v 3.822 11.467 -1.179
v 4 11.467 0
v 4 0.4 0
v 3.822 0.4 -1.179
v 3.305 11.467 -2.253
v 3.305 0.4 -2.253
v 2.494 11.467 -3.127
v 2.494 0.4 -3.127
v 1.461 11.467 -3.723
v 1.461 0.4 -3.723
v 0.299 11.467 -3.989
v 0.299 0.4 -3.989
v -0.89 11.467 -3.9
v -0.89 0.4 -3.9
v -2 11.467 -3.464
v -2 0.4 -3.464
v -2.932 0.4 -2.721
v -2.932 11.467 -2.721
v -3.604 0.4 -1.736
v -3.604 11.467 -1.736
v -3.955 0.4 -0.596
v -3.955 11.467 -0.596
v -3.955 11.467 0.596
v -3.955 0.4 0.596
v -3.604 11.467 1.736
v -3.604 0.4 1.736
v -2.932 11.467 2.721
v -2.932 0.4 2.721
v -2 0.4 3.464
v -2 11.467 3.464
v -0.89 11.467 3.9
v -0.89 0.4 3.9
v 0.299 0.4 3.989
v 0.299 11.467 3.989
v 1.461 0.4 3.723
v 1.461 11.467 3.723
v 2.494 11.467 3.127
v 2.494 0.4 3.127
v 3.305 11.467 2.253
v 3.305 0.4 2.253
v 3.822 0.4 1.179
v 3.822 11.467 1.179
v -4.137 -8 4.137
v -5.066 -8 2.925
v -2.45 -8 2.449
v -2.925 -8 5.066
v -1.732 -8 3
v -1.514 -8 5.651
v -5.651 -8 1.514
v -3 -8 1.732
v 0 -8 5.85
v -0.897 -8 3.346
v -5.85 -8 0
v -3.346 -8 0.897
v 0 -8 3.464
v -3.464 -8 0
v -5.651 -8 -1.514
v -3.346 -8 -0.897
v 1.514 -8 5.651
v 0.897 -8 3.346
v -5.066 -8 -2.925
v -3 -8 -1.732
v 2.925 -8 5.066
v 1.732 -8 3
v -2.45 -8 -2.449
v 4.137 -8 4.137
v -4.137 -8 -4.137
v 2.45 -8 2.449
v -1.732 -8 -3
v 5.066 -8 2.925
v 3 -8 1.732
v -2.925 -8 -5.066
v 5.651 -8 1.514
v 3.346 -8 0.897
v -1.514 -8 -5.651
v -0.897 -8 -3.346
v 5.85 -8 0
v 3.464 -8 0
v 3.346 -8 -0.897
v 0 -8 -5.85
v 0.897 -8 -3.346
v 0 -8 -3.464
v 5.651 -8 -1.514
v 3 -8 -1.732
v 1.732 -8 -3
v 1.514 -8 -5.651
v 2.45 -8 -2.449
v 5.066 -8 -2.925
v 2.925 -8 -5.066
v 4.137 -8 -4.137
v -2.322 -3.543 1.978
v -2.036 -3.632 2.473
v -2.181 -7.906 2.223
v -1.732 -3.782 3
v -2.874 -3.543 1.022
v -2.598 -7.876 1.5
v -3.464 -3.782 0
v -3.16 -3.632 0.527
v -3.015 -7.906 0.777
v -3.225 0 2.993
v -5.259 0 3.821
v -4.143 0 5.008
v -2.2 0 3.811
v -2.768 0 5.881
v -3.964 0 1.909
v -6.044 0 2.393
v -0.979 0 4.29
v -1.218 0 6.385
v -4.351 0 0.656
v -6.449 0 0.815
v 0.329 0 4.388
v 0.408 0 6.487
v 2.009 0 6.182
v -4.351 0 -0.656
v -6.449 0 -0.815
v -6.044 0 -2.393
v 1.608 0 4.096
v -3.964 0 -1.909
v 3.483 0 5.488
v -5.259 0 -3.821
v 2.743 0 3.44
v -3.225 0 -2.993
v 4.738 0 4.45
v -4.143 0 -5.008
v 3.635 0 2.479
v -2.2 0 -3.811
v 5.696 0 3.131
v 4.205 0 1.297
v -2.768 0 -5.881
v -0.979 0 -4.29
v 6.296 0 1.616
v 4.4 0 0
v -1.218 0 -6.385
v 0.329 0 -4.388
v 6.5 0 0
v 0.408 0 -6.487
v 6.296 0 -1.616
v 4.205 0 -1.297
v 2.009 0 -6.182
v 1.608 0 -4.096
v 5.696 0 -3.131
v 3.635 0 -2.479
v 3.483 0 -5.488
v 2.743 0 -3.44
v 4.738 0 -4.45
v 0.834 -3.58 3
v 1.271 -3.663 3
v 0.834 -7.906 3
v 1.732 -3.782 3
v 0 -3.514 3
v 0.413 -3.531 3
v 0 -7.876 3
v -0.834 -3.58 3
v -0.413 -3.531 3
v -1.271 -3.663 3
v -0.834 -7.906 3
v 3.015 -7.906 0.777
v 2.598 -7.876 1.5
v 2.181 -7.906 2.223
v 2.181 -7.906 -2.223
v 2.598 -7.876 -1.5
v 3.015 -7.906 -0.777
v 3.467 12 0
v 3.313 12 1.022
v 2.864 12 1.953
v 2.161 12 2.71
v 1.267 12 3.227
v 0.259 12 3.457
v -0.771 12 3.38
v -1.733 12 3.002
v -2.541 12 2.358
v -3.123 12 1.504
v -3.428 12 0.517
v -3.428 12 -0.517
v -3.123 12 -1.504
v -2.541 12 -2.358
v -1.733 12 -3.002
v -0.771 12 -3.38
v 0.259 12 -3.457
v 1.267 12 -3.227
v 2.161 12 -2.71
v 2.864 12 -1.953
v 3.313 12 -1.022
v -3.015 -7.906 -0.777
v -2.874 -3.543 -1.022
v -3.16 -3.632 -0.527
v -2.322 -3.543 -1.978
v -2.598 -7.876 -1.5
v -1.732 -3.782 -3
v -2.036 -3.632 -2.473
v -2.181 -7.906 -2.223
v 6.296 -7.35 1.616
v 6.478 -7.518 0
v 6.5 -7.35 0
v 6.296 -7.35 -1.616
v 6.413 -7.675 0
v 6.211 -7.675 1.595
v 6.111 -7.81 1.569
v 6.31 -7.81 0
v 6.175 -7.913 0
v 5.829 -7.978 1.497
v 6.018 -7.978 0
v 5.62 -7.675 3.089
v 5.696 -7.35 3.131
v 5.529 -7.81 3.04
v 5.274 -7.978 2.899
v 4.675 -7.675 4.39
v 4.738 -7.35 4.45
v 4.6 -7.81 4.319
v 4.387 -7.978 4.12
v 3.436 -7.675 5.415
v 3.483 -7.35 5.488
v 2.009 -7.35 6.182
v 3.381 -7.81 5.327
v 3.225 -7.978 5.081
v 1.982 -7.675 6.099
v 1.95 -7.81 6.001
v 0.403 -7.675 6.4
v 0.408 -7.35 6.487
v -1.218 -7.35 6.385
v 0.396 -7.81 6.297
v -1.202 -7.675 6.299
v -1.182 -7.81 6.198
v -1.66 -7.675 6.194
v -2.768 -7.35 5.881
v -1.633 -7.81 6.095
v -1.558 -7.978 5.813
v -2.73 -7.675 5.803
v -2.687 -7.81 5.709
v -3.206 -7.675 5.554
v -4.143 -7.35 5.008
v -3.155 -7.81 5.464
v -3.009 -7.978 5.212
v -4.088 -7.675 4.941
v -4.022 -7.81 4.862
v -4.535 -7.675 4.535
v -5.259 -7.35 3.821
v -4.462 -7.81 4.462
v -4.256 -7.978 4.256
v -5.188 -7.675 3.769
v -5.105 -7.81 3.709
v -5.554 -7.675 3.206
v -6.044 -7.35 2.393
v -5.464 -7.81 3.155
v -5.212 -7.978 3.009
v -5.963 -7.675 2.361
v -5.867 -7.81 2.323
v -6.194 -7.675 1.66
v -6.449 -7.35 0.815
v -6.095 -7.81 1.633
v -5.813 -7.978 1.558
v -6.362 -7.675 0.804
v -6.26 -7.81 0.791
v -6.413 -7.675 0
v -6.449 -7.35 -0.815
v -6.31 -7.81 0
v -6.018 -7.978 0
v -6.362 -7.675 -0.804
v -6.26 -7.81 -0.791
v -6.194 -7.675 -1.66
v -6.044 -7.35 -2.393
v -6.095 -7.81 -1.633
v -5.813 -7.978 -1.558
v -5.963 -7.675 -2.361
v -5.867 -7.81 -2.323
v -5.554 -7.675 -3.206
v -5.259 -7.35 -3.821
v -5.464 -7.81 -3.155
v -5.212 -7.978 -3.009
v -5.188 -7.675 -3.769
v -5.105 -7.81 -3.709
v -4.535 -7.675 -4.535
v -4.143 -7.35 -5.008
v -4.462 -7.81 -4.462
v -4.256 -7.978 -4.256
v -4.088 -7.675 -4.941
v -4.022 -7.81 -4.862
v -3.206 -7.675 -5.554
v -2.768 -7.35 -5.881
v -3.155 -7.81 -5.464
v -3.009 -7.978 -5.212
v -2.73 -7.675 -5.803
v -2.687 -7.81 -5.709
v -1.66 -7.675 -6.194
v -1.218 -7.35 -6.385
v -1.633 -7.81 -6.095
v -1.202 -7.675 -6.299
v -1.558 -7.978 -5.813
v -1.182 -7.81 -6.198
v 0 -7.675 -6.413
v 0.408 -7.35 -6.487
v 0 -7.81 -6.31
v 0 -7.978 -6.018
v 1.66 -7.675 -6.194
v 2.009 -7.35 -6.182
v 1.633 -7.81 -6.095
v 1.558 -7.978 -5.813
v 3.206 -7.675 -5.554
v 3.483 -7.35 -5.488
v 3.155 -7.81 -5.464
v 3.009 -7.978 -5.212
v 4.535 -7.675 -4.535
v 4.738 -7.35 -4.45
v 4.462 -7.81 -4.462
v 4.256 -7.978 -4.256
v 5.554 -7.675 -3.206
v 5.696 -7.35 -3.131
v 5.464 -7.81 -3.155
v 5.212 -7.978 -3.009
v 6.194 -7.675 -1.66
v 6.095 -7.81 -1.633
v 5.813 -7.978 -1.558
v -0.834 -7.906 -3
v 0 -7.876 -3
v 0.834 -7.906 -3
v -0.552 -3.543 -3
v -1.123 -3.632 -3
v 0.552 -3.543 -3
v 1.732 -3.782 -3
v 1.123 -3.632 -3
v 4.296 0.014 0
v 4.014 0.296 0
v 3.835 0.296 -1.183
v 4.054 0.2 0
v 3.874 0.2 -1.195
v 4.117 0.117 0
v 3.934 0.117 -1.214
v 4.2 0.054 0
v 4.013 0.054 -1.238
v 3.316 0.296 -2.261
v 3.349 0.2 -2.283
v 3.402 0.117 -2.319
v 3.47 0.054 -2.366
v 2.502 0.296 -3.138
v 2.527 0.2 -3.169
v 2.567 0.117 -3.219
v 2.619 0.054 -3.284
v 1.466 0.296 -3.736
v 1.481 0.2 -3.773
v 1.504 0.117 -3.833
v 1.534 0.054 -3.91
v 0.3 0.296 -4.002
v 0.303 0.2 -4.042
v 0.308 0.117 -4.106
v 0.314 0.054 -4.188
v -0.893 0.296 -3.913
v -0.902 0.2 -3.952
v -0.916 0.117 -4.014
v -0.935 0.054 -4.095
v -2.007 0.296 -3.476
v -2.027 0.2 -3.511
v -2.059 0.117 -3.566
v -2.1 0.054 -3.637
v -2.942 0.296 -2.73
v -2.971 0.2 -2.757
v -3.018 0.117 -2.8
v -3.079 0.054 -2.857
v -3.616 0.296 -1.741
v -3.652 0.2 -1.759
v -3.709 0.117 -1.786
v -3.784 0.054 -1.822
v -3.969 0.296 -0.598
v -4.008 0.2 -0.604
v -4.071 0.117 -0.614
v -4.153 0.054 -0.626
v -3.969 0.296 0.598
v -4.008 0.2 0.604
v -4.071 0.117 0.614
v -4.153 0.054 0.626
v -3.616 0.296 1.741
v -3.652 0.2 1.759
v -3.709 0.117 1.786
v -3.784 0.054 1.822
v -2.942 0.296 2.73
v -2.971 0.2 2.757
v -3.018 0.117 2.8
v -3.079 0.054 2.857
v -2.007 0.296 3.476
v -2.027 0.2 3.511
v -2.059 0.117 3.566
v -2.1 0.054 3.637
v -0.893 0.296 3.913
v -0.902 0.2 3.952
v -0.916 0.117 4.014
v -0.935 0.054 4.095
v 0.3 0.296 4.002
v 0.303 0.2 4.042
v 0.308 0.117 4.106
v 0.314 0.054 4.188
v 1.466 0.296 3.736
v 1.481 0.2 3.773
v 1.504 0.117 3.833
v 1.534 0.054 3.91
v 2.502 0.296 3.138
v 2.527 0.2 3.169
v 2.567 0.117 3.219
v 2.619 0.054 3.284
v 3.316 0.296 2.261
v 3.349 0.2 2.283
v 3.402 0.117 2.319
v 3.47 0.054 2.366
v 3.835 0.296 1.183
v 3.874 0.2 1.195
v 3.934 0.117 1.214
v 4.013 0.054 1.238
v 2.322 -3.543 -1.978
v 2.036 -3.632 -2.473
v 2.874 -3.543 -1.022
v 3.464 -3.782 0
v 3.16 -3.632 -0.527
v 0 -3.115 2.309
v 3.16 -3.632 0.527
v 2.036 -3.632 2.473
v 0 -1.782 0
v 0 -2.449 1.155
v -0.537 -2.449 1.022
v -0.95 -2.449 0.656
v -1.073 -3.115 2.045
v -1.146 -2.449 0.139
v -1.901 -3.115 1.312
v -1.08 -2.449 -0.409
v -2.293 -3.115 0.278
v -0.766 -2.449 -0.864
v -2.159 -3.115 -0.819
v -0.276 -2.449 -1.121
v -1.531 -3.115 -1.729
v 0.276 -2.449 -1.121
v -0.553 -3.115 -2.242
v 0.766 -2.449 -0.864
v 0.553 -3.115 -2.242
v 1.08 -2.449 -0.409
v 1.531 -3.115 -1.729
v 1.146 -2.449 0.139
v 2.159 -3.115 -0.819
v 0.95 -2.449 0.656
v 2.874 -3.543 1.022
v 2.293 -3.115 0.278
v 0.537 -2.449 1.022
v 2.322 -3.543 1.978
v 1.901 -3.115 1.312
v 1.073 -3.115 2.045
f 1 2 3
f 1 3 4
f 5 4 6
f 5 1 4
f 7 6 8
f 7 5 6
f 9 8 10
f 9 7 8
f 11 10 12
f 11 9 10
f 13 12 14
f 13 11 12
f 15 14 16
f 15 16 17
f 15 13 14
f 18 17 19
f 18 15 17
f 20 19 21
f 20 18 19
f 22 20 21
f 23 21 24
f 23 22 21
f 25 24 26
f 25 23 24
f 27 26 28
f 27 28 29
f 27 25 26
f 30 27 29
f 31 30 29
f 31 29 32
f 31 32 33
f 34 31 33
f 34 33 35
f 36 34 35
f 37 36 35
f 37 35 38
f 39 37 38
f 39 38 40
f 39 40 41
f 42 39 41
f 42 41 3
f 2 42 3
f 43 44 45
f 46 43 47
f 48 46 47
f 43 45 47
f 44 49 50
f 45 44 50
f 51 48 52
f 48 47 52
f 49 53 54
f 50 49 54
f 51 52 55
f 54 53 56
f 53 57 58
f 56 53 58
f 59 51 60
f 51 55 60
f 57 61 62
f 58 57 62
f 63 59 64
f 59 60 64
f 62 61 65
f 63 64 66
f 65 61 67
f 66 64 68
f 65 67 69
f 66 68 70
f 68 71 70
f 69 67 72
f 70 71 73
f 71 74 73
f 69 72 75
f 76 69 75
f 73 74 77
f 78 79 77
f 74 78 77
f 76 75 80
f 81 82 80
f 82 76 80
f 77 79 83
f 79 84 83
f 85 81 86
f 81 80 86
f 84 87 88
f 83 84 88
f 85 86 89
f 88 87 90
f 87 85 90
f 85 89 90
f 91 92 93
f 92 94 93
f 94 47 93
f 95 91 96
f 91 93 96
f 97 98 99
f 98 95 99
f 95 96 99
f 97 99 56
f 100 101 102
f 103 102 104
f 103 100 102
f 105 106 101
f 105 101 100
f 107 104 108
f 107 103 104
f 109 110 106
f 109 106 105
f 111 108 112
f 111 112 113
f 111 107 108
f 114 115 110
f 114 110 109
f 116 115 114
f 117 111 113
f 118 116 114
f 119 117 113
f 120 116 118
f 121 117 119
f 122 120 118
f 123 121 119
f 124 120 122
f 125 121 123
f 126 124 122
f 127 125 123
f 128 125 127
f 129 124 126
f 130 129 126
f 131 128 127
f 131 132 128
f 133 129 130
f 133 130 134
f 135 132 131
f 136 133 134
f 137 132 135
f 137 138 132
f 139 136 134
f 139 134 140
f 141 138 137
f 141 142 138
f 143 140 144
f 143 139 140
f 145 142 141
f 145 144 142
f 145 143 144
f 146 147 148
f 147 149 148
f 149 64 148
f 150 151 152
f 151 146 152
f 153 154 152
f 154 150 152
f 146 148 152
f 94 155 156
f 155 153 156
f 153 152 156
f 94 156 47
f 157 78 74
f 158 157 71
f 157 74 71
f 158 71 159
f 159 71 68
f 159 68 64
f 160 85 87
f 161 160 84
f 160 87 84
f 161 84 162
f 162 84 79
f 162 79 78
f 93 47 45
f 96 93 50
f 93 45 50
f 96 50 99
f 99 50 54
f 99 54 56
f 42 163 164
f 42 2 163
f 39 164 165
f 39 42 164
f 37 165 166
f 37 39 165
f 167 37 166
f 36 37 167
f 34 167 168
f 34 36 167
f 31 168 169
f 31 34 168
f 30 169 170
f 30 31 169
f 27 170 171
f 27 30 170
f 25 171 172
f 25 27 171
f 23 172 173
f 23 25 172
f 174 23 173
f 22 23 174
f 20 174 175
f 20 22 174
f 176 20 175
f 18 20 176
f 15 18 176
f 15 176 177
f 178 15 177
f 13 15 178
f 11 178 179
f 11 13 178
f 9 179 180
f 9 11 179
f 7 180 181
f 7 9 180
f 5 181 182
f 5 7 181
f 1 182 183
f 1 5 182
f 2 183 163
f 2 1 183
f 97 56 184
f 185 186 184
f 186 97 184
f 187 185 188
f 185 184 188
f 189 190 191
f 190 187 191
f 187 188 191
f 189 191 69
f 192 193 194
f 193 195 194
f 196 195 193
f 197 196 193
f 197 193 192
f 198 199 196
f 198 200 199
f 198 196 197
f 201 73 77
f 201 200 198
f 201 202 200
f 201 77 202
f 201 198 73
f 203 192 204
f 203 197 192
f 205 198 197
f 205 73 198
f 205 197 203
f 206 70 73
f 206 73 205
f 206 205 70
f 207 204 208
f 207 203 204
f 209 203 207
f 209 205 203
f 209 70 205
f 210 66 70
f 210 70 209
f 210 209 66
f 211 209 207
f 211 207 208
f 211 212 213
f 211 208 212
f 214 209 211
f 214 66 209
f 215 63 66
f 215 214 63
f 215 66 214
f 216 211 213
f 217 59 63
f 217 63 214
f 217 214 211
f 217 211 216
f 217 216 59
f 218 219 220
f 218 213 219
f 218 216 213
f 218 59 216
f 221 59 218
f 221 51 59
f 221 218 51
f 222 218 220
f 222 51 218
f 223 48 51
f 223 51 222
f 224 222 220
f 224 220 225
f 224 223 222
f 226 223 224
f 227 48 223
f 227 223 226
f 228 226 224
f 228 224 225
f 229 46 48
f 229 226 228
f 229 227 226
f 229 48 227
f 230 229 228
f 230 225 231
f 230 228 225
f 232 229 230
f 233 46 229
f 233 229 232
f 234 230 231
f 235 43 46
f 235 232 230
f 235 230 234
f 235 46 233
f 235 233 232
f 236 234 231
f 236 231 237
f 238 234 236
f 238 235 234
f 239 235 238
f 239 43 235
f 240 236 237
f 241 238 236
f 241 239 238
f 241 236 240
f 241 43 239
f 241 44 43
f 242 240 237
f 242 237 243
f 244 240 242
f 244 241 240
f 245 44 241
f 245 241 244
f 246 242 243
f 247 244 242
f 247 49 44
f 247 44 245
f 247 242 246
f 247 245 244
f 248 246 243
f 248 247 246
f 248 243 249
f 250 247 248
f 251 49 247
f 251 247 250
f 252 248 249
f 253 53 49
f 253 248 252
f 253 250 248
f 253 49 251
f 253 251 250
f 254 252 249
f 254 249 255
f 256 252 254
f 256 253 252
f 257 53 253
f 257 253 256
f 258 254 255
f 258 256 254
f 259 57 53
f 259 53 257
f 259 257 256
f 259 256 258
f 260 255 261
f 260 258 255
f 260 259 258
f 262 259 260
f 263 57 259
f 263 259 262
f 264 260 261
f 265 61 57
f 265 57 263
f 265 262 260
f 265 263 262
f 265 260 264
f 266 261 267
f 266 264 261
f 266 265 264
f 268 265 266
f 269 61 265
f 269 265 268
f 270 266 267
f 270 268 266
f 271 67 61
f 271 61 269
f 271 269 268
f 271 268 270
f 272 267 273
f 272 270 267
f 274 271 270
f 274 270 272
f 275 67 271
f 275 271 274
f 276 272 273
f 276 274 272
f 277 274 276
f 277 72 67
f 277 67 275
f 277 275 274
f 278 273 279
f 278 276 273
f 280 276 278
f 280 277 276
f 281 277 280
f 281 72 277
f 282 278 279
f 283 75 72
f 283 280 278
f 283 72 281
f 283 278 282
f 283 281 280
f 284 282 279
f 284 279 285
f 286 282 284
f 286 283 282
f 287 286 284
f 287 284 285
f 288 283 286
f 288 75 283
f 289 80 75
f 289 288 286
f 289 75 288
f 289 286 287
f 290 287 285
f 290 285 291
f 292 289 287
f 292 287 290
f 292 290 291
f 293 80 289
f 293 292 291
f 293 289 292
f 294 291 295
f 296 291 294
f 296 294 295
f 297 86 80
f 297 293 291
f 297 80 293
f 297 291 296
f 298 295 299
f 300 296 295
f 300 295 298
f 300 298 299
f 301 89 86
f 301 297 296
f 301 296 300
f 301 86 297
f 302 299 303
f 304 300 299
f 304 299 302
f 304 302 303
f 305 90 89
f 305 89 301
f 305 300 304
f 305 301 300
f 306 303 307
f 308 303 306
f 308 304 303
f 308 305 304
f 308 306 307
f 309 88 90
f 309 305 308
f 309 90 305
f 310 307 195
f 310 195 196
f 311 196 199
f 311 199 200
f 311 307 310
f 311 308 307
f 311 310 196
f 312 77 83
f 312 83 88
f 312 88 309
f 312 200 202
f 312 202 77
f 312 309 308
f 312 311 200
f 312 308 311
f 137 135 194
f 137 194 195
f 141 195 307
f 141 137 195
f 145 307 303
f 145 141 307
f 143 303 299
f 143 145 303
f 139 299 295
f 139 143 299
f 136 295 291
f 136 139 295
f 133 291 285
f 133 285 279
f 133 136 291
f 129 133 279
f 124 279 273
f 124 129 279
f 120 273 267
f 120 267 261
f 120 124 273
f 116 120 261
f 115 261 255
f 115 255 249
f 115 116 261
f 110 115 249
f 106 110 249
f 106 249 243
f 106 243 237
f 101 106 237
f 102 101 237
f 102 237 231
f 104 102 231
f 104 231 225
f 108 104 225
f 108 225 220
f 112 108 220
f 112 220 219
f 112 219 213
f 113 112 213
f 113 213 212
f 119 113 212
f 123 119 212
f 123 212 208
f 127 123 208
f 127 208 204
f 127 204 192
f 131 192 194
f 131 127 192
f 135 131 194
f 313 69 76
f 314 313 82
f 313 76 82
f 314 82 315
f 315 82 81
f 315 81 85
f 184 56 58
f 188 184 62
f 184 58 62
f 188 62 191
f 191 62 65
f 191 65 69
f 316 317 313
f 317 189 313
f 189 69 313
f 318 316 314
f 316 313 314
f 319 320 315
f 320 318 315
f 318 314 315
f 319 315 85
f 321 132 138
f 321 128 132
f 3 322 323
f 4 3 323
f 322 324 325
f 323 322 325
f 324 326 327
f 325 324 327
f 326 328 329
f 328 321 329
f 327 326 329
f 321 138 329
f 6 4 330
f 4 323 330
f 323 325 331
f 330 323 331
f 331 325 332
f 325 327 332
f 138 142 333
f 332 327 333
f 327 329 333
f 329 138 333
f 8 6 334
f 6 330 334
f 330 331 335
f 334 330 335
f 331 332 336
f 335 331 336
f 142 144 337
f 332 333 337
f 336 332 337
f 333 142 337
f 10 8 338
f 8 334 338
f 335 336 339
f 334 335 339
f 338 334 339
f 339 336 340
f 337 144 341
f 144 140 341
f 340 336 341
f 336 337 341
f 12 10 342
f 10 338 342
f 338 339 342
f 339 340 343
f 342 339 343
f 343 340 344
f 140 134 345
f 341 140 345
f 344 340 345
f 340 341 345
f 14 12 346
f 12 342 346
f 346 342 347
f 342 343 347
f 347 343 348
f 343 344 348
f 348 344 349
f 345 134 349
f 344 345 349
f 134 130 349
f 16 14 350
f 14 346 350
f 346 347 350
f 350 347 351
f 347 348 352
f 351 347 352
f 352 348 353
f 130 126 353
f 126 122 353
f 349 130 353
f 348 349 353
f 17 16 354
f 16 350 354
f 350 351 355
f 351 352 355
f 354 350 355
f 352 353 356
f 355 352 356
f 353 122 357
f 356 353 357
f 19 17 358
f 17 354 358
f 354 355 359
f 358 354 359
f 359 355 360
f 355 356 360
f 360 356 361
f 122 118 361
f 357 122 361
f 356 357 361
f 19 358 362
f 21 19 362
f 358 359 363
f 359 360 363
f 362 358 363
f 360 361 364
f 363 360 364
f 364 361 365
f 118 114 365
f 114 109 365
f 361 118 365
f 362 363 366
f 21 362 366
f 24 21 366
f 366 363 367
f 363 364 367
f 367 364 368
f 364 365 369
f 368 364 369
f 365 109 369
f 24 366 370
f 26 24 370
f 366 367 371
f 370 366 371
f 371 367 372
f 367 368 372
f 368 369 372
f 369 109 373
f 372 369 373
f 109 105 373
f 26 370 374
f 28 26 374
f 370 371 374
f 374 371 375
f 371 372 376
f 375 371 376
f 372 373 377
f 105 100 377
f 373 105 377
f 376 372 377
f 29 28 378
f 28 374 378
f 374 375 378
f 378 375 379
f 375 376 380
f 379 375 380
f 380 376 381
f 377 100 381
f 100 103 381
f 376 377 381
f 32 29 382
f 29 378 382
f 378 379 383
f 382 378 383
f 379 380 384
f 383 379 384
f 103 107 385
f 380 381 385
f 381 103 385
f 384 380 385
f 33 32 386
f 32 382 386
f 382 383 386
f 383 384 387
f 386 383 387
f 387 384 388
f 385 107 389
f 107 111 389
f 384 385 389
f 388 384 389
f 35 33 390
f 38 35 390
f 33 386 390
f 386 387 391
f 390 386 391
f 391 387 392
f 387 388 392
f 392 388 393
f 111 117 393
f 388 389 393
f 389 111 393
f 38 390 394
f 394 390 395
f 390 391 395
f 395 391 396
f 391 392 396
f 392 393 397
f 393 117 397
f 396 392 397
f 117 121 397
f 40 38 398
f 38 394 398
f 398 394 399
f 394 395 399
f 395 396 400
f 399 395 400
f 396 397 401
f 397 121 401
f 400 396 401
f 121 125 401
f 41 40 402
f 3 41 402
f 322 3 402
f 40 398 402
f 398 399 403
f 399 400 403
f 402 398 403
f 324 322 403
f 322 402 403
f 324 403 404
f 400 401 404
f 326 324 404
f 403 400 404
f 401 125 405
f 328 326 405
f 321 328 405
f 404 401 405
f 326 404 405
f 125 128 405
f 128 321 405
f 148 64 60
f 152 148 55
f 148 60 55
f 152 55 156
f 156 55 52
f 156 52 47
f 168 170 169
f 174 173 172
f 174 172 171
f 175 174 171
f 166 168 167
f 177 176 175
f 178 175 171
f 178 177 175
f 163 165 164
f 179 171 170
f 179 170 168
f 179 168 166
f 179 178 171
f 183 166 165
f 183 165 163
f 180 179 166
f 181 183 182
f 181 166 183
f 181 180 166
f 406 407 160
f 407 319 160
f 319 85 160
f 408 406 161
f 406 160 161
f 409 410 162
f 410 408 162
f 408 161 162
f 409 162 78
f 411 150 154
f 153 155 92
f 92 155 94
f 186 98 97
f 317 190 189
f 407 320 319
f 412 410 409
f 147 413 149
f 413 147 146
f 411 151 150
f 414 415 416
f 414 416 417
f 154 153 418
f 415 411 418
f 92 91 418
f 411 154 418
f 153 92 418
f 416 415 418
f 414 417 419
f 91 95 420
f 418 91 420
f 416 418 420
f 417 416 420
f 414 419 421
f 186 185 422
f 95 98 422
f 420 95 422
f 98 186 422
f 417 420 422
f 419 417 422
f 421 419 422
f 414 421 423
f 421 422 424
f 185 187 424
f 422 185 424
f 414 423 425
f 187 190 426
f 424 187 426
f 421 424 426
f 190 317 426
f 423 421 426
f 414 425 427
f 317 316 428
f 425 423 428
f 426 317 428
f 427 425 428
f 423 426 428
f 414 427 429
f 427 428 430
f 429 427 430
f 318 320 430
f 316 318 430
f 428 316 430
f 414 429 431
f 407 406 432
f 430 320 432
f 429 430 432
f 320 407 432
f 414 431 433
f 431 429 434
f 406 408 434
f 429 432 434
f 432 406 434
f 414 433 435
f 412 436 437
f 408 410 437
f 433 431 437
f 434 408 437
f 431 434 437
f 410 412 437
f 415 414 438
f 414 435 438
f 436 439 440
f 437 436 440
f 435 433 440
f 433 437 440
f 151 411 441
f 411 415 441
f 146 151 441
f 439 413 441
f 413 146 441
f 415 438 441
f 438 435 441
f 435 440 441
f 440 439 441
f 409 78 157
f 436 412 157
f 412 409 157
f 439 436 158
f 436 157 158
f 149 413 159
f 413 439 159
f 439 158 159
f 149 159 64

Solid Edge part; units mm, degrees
sketch "Sketch1" plane through (0, 0, 0) normal (0, 0, 1) x (1, 0, 0)
  line L0 (4, 0) -> (4, 12)
  line L1 (0, 12) -> (4, 12)
  line L2 (0, 0) -> (0, 12)
  line L3 (0, 0) -> (0, -8)
  line L4 (0, -8) -> (6.5, -8)
  line L5 (6.5, -8) -> (6.5, 0)
  line L6 (6.5, 0) -> (4, 0)
revolve "RevolvedProtrusion1" add sketch "Sketch1" angle 360 about axis through (0, 0, 0) along (0, 1, 0)
sketch "Sketch2" plane through (0, 0, 0) normal (1, 0, 0) x (0, 1, 0)
  line L0 (-8, 3.8415) -> (-4, 3.8415)
  line L1 (-1.7821, 0) -> (-4, 3.8415)
  line L2 (-8, 0) -> (-1.7821, 0)
  line L3 (-8, 0) -> (-8, 3.8415)
revolve "RevolvedCutout1" cut sketch "Sketch2" angle 360 about axis through (0, -4.5, 0) along (0, 1, 0)
sketch "Sketch3" plane through (0, -8, 0) normal (0, -1, 0) x (0, 0, 1)
  circle A0 centre (0, 0) radius 3.8415
  line L0 (-3, -1.7321) -> (0, -3.4641)
  line L1 (0, -3.4641) -> (3, -1.7321)
  line L2 (3, -1.7321) -> (3, 1.7321)
  line L3 (3, 1.7321) -> (0, 3.4641)
  line L4 (0, 3.4641) -> (-3, 1.7321)
  line L5 (-3, 1.7321) -> (-3, -1.7321)
  dimension "D1" = 6
extrude "Protrusion1" add sketch "Sketch3" against normal up to next
sketch "Sketch4" plane through (0, 0, 0) normal (0, 0, 1) x (1, 0, 0)
  line L0 (-3.4641, -8) -> (0, -8)
  line L1 (0, -8) -> (0, -7.0718)
  line L2 (0, -7.0718) -> (-3.4641, -8)
revolve "RevolvedCutout2" cut sketch "Sketch4" angle 360 about axis through (0, -4.5, 0) along (0, 1, 0)
fillet "Round1" radius 0.4 1 edges at (0, 0, -4)
fillet "Round2" radius 0.65 1 edges at (0, -8, -6.5)
chamfer "倒斜角_2" distance 0.5333 angle 45 1 edges at (0, 12, -4)
cosmetic_thread "螺纹_3" size "M8" thread depth 9.6
